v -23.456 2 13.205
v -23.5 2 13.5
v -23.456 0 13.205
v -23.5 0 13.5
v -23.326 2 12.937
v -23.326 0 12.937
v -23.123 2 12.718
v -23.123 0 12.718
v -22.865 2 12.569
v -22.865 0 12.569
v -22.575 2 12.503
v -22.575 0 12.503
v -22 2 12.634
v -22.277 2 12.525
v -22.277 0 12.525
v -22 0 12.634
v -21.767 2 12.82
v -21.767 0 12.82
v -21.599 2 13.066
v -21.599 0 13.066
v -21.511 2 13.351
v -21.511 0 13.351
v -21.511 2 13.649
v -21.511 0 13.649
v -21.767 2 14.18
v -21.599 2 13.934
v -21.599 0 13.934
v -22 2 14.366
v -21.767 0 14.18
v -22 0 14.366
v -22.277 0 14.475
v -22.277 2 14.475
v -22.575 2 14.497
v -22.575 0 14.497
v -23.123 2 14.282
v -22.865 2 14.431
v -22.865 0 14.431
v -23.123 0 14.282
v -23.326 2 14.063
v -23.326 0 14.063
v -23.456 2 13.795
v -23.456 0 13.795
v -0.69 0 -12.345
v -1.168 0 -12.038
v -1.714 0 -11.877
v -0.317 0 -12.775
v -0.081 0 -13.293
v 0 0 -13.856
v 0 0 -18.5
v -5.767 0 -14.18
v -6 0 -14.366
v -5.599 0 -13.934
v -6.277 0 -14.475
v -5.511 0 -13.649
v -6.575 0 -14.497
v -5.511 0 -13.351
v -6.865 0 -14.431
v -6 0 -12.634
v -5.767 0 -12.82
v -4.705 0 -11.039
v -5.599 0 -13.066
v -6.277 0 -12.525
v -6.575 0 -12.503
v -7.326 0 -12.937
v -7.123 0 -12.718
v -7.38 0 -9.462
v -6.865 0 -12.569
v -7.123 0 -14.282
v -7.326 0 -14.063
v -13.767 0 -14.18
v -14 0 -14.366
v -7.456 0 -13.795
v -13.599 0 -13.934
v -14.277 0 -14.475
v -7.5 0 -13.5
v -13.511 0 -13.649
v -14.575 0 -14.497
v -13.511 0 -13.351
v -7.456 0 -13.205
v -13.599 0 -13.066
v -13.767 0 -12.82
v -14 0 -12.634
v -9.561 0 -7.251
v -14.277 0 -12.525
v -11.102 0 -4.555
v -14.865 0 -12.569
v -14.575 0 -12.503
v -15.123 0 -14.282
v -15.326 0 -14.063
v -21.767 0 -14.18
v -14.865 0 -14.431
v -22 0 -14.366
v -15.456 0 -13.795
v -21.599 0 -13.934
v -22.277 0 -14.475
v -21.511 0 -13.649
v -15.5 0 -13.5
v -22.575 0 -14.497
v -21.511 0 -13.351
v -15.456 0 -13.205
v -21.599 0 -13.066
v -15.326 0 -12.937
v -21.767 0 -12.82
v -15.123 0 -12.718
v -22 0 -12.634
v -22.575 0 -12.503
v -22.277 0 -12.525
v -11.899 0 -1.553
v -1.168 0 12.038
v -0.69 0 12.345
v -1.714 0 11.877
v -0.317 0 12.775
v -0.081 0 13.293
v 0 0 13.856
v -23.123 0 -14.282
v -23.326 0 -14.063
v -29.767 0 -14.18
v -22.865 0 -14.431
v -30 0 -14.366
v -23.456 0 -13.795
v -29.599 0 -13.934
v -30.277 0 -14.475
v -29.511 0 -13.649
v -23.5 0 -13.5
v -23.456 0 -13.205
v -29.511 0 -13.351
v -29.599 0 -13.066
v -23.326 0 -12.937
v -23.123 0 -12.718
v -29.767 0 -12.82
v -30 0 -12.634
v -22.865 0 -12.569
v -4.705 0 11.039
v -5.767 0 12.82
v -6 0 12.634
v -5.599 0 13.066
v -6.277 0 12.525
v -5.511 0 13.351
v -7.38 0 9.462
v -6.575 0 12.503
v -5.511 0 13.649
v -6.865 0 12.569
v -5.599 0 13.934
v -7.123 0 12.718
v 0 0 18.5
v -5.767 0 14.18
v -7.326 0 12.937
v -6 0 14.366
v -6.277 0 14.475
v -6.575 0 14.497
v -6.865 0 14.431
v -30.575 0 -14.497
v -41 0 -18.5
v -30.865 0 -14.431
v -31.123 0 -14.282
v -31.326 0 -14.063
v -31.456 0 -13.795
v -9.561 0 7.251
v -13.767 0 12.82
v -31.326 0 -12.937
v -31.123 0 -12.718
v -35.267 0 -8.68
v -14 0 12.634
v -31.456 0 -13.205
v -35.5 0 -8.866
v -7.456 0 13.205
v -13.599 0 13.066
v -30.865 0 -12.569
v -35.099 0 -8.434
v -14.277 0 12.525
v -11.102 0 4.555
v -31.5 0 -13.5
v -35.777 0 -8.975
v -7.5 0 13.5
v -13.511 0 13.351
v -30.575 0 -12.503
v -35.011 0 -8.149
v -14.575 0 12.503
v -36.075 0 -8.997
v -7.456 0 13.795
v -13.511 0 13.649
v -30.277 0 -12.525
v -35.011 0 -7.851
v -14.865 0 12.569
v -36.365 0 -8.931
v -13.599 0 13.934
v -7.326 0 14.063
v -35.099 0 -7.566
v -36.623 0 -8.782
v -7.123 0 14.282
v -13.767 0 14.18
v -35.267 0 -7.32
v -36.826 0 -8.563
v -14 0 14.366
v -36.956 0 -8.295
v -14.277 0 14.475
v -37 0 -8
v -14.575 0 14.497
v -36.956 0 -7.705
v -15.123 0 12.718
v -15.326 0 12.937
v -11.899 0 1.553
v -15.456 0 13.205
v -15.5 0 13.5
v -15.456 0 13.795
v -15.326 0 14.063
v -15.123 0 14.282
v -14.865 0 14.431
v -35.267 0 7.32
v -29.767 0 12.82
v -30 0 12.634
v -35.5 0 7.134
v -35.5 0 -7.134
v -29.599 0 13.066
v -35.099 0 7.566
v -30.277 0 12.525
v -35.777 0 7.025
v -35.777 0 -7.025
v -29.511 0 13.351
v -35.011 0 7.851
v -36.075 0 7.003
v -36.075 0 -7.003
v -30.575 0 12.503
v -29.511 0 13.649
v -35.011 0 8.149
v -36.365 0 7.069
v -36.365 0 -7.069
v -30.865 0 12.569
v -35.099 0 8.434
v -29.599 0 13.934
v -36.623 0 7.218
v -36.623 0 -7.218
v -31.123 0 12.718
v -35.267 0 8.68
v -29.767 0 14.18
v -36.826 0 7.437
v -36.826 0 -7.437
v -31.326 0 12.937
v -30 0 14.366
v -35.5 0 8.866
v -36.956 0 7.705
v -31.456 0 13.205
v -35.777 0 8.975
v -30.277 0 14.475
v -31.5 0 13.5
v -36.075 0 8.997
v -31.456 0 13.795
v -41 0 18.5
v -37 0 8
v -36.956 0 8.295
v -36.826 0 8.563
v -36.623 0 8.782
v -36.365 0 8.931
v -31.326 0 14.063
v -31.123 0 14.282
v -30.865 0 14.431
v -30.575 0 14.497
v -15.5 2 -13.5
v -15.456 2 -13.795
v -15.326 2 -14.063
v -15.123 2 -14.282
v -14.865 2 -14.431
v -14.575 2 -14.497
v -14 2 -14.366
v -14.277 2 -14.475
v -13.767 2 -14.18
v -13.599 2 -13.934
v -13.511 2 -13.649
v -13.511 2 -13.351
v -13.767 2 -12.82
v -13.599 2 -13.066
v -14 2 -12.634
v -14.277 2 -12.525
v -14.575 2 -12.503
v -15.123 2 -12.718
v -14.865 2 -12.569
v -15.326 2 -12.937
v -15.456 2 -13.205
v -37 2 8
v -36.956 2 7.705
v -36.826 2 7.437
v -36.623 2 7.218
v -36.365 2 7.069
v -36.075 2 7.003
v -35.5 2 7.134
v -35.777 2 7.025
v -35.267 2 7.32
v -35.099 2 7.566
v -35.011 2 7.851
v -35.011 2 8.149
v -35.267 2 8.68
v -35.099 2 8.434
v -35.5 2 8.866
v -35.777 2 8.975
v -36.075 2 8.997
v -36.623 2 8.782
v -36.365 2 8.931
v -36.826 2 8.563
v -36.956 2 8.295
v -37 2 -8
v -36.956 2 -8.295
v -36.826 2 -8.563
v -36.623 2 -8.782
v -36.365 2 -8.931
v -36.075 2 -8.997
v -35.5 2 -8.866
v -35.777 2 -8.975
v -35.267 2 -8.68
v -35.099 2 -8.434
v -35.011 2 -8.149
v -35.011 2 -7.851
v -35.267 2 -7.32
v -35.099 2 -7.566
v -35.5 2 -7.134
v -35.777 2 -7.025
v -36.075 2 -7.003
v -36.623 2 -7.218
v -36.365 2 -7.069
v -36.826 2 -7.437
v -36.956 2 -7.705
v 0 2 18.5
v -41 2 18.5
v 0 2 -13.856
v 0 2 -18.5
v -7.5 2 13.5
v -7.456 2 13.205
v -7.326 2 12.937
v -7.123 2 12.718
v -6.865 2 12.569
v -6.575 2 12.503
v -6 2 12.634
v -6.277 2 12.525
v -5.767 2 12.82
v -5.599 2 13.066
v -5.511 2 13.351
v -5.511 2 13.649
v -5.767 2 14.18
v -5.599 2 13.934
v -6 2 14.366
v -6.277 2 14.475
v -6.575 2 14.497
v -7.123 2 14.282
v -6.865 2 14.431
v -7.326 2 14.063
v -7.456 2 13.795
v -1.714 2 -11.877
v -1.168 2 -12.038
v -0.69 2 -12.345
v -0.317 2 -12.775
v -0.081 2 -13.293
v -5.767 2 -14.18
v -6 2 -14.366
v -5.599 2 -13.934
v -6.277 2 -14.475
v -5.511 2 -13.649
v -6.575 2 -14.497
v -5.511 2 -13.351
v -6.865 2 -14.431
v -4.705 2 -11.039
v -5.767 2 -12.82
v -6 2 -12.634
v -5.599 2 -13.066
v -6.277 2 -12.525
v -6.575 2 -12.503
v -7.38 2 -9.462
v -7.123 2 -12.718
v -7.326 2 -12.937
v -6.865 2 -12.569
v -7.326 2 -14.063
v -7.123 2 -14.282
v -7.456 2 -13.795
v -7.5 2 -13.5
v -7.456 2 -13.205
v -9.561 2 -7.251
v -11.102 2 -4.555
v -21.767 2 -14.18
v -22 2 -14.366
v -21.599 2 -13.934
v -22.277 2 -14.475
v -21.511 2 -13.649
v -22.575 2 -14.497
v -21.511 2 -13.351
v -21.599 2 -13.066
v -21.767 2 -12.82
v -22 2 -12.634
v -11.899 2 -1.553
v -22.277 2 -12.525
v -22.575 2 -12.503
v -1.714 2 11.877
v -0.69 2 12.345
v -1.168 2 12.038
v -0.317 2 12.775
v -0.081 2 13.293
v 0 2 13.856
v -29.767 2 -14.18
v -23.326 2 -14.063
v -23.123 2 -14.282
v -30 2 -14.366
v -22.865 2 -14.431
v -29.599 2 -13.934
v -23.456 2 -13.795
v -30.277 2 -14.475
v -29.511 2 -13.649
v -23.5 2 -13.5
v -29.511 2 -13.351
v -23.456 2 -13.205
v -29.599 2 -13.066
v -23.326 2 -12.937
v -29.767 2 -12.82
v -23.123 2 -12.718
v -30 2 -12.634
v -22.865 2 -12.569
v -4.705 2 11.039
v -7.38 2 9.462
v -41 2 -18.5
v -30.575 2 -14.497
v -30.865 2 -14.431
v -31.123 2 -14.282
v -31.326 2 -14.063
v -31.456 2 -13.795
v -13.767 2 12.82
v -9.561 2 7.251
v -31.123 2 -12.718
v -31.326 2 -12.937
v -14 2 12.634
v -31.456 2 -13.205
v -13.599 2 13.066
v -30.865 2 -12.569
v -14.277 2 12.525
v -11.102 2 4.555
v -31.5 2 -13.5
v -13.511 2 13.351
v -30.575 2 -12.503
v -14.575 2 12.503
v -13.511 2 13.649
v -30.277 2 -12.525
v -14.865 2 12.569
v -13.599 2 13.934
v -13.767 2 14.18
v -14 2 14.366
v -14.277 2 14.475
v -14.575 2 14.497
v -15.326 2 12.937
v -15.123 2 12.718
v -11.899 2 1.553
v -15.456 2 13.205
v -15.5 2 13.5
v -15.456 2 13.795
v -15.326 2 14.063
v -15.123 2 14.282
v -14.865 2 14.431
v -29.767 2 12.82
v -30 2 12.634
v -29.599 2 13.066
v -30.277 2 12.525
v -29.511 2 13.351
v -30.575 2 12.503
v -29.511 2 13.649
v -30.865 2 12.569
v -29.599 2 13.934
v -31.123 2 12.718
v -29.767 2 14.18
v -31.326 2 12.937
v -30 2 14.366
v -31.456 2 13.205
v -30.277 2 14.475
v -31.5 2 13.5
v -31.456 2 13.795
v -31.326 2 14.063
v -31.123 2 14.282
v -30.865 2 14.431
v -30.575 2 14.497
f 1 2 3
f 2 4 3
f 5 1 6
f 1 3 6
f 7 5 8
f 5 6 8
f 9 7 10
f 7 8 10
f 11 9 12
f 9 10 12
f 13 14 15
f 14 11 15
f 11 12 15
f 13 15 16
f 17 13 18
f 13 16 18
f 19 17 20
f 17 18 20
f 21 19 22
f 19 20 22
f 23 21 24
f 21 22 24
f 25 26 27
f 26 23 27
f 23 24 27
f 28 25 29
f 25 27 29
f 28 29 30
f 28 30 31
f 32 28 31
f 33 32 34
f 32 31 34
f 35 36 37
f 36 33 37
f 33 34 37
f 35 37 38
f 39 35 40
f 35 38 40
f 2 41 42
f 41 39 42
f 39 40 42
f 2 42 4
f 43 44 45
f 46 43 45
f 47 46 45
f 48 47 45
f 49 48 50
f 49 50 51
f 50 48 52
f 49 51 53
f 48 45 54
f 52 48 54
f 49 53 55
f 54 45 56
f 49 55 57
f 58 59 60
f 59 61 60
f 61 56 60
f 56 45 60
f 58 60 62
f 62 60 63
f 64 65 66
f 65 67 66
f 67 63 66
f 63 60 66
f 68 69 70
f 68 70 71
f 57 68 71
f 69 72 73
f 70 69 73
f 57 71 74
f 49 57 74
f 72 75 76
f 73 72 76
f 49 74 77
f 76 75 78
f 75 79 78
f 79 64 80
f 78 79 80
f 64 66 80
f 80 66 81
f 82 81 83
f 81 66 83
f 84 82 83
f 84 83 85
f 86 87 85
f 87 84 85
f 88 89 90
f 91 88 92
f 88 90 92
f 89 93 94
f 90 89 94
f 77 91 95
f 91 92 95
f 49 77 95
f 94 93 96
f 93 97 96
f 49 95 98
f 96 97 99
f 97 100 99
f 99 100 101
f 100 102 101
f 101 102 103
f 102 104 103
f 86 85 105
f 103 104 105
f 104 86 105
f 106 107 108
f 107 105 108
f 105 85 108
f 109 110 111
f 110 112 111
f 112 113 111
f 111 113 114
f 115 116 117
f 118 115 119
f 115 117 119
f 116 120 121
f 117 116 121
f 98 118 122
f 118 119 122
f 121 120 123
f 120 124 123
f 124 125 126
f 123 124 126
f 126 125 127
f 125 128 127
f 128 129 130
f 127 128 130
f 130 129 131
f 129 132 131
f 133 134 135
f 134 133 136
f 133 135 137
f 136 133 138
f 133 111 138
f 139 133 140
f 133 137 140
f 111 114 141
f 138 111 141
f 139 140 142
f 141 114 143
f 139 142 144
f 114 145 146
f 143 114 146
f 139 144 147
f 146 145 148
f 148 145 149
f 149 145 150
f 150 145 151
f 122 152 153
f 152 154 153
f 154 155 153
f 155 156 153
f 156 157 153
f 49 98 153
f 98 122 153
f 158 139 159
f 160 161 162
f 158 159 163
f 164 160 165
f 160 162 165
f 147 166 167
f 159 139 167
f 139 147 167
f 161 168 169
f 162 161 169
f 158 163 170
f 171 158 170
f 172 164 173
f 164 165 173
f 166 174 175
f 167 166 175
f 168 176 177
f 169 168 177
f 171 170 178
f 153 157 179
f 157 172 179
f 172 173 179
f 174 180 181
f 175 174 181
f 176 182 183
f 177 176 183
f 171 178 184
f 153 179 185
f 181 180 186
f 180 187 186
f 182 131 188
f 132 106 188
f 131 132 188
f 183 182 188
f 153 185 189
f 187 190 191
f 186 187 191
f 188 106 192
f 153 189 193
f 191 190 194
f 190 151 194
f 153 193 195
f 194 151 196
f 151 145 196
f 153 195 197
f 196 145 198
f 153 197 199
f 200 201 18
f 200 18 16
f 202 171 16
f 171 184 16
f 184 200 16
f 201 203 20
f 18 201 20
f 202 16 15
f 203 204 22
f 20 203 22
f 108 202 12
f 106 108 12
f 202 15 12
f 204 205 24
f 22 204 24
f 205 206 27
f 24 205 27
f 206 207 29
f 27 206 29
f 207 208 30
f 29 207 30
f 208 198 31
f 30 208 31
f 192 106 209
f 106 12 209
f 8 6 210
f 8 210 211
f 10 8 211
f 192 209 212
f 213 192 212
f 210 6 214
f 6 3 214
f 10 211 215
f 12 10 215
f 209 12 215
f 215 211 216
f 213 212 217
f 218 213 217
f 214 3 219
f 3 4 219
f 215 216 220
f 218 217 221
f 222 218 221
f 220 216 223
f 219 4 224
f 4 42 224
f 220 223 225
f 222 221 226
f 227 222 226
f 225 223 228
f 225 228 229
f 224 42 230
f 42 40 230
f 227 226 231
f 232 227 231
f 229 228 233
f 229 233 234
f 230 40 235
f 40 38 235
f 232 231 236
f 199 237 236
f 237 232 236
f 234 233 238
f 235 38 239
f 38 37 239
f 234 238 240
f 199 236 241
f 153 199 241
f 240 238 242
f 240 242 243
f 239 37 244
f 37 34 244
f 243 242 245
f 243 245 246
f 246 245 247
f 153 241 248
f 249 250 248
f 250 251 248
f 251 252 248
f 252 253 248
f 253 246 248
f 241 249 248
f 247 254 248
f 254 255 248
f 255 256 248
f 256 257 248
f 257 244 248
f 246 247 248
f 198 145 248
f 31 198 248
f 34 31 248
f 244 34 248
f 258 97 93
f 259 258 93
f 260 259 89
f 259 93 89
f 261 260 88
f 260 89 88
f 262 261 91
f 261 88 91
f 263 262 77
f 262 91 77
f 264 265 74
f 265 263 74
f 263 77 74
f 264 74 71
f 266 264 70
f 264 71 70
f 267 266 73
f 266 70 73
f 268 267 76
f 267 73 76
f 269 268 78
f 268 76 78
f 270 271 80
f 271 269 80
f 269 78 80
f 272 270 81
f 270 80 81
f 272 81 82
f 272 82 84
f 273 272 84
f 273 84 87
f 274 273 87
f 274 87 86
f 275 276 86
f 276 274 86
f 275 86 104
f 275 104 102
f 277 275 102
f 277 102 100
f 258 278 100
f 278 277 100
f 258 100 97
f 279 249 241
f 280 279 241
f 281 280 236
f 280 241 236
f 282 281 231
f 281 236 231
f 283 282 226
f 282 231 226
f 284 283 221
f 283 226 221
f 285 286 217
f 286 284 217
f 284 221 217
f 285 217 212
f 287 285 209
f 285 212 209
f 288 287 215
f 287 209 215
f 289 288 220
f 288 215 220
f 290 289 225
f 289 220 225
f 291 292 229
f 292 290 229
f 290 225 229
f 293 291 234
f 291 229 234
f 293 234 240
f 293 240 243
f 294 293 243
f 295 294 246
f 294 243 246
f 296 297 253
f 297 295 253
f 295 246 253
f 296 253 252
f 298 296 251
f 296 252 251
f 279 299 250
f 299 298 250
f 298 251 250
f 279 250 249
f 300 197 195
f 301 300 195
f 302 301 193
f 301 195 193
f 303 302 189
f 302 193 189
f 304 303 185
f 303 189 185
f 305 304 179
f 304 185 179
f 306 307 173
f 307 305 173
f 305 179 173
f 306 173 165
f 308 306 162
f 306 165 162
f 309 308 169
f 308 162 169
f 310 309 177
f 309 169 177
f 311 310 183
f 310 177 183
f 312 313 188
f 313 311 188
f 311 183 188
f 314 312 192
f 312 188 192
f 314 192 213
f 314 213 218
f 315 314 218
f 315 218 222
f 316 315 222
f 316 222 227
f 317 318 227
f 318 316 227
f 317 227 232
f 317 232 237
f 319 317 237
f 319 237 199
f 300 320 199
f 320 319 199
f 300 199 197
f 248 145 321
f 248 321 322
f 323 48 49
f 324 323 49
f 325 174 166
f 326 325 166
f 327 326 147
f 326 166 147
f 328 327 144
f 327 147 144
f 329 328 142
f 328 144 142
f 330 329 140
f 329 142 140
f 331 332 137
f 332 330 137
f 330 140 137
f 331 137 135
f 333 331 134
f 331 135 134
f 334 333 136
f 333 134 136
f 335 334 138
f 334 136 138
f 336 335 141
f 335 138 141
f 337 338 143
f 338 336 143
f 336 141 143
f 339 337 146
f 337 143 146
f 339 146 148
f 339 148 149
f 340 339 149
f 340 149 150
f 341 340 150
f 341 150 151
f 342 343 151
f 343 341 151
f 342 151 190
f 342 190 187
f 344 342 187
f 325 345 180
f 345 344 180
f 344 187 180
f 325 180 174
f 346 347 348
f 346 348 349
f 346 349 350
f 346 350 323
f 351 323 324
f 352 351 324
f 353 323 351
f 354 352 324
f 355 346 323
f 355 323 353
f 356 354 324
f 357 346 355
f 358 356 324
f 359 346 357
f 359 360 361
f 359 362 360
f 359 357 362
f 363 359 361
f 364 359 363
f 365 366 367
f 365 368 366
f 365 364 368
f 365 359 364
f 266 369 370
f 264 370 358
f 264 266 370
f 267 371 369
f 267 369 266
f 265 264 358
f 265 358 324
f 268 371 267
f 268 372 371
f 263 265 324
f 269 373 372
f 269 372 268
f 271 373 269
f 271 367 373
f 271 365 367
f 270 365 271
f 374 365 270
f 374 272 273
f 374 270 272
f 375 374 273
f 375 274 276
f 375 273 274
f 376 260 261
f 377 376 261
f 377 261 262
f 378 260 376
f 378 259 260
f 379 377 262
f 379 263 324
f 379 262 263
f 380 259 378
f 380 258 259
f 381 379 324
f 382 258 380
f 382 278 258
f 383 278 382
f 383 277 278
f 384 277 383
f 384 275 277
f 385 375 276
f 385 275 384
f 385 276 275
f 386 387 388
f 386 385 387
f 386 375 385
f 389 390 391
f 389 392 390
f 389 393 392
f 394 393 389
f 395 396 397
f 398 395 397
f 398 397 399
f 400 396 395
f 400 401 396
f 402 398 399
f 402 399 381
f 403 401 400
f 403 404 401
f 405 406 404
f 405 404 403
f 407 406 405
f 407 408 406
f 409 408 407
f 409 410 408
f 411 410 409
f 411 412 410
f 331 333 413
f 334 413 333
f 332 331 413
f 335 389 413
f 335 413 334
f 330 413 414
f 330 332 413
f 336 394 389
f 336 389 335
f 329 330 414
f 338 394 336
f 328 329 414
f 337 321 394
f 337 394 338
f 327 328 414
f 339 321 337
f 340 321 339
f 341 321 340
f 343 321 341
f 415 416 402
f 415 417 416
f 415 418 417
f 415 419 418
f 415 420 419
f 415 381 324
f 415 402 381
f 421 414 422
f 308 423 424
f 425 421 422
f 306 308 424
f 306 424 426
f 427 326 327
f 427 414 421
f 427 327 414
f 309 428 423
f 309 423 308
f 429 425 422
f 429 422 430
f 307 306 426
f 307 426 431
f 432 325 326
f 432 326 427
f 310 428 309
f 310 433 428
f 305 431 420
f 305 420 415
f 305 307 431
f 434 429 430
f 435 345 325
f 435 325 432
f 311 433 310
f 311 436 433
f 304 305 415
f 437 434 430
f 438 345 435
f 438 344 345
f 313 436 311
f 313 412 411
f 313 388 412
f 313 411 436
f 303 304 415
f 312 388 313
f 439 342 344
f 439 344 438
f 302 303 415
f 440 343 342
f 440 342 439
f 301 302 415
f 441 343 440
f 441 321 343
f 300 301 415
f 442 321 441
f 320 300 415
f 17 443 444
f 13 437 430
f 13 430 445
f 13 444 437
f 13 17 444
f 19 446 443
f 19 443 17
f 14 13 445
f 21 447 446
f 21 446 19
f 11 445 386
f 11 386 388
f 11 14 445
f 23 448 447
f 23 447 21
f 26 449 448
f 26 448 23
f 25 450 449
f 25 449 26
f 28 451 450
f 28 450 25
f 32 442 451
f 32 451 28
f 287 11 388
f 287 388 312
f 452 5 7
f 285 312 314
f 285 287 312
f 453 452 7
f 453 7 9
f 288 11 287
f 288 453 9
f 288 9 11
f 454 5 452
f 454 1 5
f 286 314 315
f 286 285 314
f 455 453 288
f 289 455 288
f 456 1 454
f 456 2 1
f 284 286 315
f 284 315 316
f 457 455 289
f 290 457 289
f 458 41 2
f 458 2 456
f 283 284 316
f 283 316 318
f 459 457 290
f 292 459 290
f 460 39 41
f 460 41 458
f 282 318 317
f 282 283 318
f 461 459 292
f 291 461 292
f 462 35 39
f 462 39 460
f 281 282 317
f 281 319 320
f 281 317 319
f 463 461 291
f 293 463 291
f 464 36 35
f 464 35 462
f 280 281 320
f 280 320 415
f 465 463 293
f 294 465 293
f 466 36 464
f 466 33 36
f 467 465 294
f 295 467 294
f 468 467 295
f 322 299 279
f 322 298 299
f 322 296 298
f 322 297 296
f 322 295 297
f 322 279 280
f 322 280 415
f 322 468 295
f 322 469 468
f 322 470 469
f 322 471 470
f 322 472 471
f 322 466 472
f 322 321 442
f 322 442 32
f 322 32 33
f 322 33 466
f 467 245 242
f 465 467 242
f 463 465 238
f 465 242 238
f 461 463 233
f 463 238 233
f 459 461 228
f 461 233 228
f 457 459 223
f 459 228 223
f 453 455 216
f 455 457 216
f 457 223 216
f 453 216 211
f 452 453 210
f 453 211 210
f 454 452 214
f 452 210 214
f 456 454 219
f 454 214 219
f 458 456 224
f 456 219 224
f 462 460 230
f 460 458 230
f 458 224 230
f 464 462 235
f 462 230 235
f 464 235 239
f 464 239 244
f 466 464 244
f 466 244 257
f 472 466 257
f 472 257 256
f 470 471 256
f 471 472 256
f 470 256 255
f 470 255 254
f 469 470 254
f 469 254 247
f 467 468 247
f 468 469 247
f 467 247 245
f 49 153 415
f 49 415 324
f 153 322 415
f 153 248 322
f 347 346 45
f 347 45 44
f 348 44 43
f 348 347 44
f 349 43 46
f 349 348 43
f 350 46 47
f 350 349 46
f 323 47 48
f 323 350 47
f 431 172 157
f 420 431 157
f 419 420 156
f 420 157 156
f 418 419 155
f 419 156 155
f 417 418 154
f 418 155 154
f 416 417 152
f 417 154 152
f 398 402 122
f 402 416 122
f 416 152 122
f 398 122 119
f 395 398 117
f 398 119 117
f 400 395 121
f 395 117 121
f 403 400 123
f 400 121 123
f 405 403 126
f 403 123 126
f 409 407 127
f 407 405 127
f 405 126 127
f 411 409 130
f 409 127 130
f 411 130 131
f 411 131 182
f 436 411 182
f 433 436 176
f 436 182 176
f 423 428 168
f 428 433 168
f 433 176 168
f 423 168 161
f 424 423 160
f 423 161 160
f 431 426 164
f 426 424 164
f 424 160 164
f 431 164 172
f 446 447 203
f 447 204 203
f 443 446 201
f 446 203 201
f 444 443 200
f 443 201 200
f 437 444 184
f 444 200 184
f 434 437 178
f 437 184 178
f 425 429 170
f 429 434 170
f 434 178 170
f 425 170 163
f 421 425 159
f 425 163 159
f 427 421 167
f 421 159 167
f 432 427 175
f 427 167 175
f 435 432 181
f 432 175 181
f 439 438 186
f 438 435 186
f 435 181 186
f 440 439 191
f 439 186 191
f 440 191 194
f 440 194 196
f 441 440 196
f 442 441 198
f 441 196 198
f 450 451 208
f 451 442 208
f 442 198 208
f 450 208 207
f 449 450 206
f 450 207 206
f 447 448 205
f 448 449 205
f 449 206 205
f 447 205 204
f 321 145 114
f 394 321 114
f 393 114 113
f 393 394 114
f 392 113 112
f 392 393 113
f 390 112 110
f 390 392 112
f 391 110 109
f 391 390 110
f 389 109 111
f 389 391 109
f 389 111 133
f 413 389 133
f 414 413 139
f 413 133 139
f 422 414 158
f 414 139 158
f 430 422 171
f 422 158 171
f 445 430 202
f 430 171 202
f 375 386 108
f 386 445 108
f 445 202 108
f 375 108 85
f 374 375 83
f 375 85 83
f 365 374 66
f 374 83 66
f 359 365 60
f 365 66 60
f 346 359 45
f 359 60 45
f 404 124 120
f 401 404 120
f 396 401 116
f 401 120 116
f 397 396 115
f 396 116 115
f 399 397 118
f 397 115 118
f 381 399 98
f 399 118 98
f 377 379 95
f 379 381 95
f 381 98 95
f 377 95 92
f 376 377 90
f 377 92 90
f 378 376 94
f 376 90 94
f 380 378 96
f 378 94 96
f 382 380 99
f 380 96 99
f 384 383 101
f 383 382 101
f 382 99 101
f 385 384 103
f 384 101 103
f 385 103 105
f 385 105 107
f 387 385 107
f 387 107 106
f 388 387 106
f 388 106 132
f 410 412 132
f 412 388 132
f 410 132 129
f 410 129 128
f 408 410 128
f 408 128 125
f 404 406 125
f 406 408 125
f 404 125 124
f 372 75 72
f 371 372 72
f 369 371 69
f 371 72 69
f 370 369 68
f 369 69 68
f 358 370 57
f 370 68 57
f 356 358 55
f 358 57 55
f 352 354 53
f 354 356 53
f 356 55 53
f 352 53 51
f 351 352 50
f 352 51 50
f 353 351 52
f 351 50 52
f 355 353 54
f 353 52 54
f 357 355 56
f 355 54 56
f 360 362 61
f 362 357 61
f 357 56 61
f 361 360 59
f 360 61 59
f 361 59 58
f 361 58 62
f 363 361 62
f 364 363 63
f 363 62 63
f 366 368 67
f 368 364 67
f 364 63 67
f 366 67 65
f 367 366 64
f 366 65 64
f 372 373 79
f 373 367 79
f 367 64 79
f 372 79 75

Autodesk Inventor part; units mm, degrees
ref_plane "YZ Plane" through (0, 0, 0) normal (1, 0, 0) x (0, 1, 0)
ref_plane "XZ Plane" through (0, 0, 0) normal (0, 1, 0) x (-1, 0, 0)
ref_plane "XY Plane" through (0, 0, 0) normal (0, 0, 1) x (1, 0, 0)
sketch "Esquisse1" plane through (0, 0, 0) normal (0, 1, 0) x (-1, 0, 0)
  line L0 (0, 0) -> (36, 0) construction
  line L1 (36, 0) -> (36, 8) construction
  line L2 (0, 0) -> (0, 13.5) construction
  line L3 (0, 13.5) -> (6.5, 13.5) construction
  line L4 (6.5, 13.5) -> (14.5, 13.5) construction
  line L5 (14.5, 13.5) -> (22.5, 13.5) construction
  line L6 (22.5, 13.5) -> (30.5, 13.5) construction
  circle A0 centre (6.5, 13.5) radius 1
  circle A1 centre (14.5, 13.5) radius 1
  circle A2 centre (22.5, 13.5) radius 1
  circle A3 centre (30.5, 13.5) radius 1
  circle A4 centre (36, 8) radius 1
  circle A5 centre (6.5, -13.5) radius 1
  circle A6 centre (14.5, -13.5) radius 1
  circle A7 centre (22.5, -13.5) radius 1
  circle A8 centre (30.5, -13.5) radius 1
  circle A9 centre (36, -8) radius 1
  line L7 (6.5, 13.5) -> (6.5, 18.5) construction
  line L8 (36, 8) -> (41, 8) construction
  circle A10 centre (0, 0) radius 12 construction
  line L9 (0, 18.5) -> (41, 18.5)
  line L10 (41, 18.5) -> (41, -18.5)
  line L11 (41, -18.5) -> (0, -18.5)
  line L12 (6.5, -13.5) -> (6.5, -18.5) construction
  line L13 (0, 18.5) -> (0, 12)
  line L14 (0, 0) -> (0, -18.5) construction
  line L15 (0, -12) -> (0, -18.5)
  arc A11 (0, -12) -> (0, 12) centre (0, 0) ccw
  dimension "d23" = 36
  dimension "d24" = 8
  dimension "d25" = 13.5
  dimension "d26" = 6.5
  dimension "d27" = 8
  dimension "d28" = 8
  dimension "d29" = 8
  dimension "d30" = 2
  dimension "d31" = 5
  dimension "d33" = 24
extrude "Extrusion2" add sketch "Esquisse1" along normal blind 2
fillet "Congé1" radius 2 1 edges at (0, 1, 12)
fillet "Congé2" radius 2 1 edges at (0, 1, -12)
properties part number "AX12_gabarit"
